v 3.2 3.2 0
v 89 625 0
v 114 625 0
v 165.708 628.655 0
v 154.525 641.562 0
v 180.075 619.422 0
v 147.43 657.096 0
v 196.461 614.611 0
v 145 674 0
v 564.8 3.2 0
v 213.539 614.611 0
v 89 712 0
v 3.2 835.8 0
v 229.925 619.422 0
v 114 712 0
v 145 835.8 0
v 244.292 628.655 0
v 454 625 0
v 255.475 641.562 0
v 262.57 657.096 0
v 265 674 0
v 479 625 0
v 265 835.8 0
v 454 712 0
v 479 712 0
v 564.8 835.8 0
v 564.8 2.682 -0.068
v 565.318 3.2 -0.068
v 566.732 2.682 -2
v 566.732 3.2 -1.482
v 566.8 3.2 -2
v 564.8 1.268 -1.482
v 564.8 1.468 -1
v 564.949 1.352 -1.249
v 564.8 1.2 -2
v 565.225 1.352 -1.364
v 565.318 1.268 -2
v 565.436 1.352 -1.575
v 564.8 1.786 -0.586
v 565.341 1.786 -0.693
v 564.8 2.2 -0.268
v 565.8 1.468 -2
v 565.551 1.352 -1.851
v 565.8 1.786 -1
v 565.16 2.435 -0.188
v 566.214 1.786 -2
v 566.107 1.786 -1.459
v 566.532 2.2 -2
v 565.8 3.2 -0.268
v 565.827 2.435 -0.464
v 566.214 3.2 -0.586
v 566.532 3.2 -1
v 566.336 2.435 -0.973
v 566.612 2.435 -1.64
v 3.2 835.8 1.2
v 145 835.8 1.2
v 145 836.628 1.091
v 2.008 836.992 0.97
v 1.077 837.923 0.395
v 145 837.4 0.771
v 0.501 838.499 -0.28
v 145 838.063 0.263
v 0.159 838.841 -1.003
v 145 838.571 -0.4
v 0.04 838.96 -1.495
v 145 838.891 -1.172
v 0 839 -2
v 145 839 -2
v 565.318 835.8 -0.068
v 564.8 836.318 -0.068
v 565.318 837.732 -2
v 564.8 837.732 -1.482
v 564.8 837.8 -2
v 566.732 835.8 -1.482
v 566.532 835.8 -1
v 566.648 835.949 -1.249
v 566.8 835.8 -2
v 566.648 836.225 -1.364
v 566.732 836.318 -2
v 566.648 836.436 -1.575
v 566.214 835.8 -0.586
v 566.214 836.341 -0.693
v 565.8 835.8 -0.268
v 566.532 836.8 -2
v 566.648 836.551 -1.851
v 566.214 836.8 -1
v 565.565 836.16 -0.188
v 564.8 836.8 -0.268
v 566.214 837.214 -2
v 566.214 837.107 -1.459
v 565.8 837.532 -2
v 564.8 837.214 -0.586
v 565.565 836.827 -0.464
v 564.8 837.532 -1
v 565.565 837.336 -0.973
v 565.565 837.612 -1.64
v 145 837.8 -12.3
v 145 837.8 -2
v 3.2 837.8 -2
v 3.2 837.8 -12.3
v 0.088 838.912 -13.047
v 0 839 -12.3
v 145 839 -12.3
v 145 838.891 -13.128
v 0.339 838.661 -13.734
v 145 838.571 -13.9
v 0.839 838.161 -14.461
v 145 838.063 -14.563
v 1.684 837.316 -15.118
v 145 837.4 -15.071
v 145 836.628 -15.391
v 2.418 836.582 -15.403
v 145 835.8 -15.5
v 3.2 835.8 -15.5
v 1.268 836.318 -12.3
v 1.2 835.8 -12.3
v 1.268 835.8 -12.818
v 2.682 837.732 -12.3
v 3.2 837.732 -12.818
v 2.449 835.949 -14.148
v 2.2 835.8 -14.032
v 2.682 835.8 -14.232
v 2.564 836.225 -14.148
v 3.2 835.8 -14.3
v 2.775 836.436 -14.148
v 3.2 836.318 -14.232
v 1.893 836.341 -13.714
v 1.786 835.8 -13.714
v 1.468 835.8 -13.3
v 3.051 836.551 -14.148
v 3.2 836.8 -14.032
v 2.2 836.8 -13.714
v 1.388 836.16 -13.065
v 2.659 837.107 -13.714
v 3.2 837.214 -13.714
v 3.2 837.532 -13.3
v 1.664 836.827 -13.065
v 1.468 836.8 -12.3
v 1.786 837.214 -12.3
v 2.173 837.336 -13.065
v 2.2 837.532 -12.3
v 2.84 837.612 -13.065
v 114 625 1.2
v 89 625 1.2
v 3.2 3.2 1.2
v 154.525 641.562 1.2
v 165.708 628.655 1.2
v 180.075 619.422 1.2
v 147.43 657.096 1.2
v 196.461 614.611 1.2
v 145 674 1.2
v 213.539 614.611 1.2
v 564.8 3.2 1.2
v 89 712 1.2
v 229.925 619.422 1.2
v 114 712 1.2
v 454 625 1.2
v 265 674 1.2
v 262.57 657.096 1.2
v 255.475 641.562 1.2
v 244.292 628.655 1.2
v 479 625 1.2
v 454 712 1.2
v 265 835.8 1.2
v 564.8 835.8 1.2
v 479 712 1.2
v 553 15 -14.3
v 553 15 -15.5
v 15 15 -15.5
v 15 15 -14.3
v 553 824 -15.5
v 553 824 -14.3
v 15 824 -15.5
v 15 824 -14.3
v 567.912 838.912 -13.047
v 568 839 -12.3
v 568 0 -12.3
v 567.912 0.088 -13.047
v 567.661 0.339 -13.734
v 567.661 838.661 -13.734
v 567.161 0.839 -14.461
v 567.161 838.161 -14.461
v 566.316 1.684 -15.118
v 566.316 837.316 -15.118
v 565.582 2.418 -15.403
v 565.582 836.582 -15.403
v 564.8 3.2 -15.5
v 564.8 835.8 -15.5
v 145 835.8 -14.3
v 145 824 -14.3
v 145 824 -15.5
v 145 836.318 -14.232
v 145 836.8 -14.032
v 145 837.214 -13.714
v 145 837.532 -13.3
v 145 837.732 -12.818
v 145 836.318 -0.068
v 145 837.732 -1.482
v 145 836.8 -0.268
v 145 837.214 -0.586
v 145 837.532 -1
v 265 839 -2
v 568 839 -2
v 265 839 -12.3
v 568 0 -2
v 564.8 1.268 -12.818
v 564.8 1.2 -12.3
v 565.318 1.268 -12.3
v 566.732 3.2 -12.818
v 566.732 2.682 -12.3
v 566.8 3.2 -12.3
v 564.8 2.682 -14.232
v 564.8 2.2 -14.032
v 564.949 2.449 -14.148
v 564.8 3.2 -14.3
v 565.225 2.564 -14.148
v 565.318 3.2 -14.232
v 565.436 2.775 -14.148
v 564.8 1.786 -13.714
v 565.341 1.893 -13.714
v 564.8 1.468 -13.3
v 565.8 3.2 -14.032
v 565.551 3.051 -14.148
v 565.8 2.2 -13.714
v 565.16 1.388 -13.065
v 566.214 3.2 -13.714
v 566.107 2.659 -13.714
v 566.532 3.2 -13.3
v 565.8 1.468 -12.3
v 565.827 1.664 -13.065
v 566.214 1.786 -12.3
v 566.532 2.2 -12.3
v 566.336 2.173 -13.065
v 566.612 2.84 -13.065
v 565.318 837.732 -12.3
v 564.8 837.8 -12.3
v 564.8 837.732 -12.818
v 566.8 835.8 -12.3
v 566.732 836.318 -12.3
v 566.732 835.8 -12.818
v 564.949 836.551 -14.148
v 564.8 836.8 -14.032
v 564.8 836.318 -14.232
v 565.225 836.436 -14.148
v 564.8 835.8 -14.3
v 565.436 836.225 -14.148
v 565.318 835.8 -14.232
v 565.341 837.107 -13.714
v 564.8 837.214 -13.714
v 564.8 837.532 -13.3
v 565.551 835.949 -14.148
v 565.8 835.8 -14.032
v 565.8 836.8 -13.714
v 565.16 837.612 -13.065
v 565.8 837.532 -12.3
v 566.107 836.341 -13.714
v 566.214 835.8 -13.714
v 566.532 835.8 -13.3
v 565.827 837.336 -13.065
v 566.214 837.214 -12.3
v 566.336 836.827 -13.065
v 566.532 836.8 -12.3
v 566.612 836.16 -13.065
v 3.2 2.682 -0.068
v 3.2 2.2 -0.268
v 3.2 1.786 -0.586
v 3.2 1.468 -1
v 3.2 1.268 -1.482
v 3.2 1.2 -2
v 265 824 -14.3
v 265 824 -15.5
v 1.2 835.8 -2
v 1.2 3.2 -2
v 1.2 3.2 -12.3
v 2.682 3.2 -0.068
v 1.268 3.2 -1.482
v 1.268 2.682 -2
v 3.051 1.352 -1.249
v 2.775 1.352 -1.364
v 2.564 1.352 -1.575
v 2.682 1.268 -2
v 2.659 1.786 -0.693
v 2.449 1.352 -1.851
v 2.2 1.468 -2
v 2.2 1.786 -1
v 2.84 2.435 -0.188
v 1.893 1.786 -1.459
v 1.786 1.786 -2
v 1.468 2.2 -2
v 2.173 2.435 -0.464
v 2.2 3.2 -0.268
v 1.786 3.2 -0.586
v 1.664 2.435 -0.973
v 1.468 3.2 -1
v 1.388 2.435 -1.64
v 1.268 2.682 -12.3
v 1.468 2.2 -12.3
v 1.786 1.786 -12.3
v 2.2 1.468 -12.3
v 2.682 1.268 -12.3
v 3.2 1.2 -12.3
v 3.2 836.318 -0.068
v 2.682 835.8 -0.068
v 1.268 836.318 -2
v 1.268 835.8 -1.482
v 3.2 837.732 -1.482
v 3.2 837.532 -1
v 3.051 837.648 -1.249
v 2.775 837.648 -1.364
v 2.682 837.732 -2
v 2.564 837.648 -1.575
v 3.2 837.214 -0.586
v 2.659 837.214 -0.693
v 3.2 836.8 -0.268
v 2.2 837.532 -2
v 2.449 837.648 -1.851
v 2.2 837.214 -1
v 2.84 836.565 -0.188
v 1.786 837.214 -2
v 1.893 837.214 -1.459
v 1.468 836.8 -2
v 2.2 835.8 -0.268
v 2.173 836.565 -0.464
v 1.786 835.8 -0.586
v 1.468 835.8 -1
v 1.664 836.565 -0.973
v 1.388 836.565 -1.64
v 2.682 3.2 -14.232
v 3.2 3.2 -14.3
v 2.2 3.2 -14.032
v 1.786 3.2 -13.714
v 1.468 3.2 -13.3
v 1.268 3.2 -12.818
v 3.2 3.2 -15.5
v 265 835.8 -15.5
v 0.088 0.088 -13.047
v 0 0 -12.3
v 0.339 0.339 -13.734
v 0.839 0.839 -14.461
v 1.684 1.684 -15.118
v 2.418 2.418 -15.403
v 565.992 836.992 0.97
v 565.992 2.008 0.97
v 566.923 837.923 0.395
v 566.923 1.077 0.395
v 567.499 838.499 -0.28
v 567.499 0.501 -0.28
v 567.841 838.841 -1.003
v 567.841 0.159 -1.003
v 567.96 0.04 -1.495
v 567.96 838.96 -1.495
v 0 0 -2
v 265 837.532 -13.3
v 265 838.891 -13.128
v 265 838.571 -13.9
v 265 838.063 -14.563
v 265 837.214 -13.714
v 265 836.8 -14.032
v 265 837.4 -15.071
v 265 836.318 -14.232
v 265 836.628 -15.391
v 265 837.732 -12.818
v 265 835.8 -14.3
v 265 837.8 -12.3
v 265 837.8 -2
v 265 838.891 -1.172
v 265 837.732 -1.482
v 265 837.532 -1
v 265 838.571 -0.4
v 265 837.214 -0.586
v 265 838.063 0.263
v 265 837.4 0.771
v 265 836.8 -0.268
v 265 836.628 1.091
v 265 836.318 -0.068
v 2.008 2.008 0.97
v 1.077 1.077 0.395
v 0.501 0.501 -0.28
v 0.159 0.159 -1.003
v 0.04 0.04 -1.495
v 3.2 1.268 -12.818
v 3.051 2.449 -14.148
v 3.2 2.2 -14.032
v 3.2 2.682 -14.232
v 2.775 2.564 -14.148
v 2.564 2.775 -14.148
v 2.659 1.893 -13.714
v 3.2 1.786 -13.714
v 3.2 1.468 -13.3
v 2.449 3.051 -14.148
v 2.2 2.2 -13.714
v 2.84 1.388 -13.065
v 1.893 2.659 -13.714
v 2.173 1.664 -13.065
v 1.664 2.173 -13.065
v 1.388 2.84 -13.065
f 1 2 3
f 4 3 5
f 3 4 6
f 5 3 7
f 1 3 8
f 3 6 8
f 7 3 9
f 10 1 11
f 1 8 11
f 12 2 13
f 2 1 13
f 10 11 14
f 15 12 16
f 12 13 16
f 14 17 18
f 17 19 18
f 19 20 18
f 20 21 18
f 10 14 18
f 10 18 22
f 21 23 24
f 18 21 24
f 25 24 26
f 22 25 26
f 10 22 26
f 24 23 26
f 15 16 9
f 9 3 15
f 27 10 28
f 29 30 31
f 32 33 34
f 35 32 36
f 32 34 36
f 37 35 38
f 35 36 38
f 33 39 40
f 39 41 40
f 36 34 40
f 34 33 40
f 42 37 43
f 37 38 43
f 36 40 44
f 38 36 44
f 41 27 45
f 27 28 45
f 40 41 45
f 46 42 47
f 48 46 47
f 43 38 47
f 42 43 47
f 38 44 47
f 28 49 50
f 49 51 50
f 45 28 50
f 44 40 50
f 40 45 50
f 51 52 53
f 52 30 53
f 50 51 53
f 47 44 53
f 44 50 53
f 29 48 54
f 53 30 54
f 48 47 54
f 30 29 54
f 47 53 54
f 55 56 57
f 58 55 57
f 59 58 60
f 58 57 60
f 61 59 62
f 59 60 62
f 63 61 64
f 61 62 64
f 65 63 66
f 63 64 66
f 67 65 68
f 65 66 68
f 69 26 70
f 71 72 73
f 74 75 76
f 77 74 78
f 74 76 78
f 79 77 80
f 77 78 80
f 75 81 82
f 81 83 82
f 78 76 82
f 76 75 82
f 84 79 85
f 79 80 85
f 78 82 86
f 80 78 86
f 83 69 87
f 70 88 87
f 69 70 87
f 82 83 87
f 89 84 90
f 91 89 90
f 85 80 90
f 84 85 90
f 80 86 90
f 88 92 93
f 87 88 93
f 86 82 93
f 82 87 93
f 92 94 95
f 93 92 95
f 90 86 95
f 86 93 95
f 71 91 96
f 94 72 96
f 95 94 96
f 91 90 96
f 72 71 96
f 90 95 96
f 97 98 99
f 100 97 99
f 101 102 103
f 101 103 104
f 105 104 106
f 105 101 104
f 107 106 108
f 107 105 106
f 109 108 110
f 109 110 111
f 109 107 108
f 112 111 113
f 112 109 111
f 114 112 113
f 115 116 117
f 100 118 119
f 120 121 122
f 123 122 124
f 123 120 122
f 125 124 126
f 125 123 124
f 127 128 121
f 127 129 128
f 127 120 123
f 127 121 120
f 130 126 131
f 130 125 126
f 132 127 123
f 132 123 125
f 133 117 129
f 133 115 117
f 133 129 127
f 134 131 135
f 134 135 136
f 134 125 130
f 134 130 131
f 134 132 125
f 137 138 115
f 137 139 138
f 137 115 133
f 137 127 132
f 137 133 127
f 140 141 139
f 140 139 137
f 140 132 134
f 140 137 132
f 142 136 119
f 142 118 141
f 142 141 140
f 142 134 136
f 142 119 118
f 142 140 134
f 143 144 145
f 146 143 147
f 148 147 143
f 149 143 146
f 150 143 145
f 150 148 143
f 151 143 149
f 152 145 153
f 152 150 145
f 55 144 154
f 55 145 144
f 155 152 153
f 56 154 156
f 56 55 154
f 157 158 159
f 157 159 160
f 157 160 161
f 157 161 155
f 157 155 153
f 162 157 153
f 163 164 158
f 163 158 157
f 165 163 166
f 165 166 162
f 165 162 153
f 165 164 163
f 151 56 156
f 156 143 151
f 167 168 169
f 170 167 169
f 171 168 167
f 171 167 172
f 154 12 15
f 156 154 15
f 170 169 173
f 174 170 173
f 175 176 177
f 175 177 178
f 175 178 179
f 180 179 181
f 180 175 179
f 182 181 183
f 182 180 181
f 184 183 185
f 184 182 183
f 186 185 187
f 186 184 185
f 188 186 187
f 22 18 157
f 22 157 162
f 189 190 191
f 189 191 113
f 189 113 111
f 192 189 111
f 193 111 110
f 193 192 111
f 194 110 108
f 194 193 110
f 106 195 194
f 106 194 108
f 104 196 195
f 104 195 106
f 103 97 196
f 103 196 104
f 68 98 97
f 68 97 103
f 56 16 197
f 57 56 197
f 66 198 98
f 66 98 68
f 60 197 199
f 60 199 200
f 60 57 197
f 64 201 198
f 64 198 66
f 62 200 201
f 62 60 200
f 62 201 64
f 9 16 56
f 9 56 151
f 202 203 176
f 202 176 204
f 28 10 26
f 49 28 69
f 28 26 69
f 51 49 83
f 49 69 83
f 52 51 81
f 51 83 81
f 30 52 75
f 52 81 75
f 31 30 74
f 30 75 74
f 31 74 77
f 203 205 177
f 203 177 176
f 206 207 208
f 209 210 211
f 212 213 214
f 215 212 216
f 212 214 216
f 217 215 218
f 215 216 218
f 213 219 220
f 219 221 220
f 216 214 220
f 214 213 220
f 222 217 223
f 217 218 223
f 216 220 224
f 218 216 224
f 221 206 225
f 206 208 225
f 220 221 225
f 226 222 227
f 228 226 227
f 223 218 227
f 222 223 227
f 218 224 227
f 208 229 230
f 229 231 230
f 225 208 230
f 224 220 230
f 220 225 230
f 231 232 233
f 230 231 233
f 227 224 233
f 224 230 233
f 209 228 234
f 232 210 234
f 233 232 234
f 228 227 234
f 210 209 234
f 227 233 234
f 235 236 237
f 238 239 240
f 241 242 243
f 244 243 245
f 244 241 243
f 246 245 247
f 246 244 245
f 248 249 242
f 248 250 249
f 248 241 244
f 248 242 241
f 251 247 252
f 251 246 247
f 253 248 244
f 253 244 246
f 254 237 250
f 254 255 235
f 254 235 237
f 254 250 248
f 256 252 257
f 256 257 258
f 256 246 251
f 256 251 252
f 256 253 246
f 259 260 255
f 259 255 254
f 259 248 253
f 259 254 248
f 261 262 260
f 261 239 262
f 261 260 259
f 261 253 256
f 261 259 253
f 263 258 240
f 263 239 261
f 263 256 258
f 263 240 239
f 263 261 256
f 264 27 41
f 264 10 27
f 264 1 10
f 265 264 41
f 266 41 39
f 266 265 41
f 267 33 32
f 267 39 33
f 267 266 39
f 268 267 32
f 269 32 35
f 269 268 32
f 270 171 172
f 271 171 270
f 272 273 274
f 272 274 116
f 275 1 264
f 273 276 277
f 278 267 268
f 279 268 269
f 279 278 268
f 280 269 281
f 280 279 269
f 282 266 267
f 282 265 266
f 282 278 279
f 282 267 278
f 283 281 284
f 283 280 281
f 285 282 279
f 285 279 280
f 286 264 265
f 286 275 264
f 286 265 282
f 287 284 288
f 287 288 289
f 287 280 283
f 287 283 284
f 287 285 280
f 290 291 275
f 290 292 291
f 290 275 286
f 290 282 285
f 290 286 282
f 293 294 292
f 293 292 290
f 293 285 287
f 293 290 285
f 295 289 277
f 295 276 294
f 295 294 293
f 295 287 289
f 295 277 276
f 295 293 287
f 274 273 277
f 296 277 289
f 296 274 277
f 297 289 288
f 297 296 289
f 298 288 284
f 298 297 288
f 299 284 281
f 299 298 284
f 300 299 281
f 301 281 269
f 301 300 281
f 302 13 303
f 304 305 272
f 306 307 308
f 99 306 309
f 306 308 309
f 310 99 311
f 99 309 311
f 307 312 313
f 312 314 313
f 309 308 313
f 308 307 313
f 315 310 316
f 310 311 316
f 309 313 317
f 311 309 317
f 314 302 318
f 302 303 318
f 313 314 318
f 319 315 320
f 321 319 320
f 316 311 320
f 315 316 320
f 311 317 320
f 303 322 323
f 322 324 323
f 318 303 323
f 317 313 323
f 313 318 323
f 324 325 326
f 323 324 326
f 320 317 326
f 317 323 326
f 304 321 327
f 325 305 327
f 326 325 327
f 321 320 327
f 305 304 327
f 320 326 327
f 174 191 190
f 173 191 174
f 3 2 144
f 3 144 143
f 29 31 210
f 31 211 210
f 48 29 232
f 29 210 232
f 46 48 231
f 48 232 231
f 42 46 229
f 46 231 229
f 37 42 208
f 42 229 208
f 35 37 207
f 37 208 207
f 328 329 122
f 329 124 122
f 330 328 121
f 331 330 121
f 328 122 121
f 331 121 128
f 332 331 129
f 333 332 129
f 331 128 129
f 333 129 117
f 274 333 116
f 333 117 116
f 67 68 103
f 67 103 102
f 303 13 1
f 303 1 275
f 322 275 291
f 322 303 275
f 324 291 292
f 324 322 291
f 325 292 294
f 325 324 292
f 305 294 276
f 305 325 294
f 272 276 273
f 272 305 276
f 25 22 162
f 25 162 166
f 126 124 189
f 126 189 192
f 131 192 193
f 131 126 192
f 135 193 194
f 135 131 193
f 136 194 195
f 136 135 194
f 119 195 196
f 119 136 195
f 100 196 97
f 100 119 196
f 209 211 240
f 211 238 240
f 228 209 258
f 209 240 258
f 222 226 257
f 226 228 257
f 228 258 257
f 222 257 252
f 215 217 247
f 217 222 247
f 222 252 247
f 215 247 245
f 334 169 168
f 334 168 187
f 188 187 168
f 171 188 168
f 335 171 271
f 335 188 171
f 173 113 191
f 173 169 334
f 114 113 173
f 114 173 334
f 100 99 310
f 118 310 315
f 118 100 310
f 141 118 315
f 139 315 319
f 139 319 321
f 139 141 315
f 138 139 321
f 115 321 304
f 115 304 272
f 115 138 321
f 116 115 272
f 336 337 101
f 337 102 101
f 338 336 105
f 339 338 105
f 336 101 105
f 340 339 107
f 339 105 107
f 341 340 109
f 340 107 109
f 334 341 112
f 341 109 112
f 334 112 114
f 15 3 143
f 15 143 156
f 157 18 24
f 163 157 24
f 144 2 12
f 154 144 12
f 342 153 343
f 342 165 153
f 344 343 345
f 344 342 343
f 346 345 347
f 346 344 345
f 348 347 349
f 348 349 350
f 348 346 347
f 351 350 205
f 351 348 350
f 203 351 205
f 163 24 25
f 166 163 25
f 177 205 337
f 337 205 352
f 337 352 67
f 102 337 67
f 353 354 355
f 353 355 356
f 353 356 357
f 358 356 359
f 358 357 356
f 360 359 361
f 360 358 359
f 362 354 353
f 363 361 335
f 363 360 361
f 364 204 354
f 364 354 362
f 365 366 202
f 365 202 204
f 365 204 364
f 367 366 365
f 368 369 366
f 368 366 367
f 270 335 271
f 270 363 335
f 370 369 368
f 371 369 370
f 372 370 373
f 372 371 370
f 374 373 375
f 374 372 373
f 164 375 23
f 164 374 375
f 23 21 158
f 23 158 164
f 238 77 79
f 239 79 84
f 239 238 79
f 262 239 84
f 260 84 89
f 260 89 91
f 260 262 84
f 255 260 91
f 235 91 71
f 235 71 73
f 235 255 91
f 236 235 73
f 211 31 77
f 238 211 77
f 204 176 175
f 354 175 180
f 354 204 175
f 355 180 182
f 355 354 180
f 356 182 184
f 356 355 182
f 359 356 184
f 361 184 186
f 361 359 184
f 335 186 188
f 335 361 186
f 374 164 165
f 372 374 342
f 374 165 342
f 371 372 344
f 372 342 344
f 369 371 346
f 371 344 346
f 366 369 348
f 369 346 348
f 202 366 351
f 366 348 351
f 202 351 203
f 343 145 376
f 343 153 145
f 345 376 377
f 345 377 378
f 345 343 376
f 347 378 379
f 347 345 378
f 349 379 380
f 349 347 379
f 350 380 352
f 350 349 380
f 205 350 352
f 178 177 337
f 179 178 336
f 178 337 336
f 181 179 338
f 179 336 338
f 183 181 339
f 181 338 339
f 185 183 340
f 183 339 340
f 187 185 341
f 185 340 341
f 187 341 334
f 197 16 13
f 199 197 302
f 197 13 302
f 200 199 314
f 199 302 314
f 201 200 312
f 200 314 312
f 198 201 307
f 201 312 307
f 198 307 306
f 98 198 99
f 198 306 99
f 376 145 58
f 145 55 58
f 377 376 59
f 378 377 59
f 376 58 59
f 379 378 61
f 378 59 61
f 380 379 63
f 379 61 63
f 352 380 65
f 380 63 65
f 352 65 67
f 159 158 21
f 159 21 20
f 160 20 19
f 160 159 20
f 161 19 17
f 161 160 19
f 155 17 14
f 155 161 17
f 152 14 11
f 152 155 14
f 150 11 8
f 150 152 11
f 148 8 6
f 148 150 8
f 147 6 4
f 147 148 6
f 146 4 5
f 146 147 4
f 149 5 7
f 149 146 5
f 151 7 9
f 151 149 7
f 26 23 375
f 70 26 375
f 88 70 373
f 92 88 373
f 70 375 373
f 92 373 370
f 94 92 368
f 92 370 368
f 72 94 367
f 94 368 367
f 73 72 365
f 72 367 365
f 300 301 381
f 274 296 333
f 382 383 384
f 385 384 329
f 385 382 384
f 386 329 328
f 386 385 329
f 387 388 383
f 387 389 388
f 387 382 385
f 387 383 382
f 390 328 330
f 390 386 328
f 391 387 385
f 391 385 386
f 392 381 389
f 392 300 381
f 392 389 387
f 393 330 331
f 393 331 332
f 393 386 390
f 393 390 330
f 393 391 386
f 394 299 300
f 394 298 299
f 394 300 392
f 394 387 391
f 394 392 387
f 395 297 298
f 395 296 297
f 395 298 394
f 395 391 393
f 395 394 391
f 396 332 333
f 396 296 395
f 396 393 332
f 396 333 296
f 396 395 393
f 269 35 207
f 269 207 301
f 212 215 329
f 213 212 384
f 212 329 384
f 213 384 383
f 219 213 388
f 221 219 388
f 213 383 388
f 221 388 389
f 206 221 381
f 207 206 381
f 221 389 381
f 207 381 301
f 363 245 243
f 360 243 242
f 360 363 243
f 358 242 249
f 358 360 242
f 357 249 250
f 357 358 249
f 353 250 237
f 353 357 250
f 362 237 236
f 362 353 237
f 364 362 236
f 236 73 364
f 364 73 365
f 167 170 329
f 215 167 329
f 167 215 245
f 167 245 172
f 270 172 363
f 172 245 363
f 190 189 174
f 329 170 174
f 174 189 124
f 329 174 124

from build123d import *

# Parameters (mm, degrees)
SKETCH_1_W          = 568
SKETCH_1_H          = 839
SKETCH_1_W_2        = 25
SKETCH_1_H_2        = 87
EXTRUDE_1_DEPTH     = 1.2
SKETCH_2_W          = 568
SKETCH_2_H          = 839
SKETCH_2_W_2        = 565.6
SKETCH_2_H_2        = 836.6
EXTRUDE_2_DEPTH     = 15.5
SKETCH_3_W          = 568
SKETCH_3_H          = 839
SKETCH_3_W_2        = 538
SKETCH_3_H_2        = 809
EXTRUDE_3_DEPTH     = 1.2
FILLET_1_R          = 2
FILLET_2_R          = 3.2
FILLET_3_R          = 3.2
CUT_EXTRUDE_1_DEPTH = 1014.323191287


with BuildPart() as part:
    # 스케치1 → 보스-돌출1 (new body)
    with BuildSketch(Plane.XY):
        with Locations((284, 419.5)):
            Rectangle(SKETCH_1_W, SKETCH_1_H)
        with Locations((101.5, 668.5)):
            Rectangle(SKETCH_1_W_2, SKETCH_1_H_2, mode=Mode.SUBTRACT)
        with Locations((466.5, 668.5)):
            Rectangle(SKETCH_1_W_2, SKETCH_1_H_2, mode=Mode.SUBTRACT)
    extrude(amount=EXTRUDE_1_DEPTH)

    # 스케치2 → 보스-돌출2 (add)
    with BuildSketch(Plane(origin=(0, 0, 0), x_dir=(-1, 0, 0), z_dir=(0, 0, -1))):
        with Locations((-284, 419.5)):
            Rectangle(SKETCH_2_W, SKETCH_2_H)
        with Locations((-284, 419.5)):
            Rectangle(SKETCH_2_W_2, SKETCH_2_H_2, mode=Mode.SUBTRACT)
    extrude(amount=EXTRUDE_2_DEPTH)

    # 스케치3 → 보스-돌출3 (add)
    with BuildSketch(Plane(origin=(0, 0, -15.5), x_dir=(-1, 0, 0), z_dir=(0, 0, -1))):
        with Locations((-284, 419.5)):
            Rectangle(SKETCH_3_W, SKETCH_3_H)
        with Locations((-284, 419.5)):
            Rectangle(SKETCH_3_W_2, SKETCH_3_H_2, mode=Mode.SUBTRACT)
    extrude(amount=-EXTRUDE_3_DEPTH)

    # 필렛1
    fillet_1_edges = [part.edges().sort_by_distance(p)[0] for p in [
        (1.2, 419.5, 0),
        (284, 837.8, 0),
        (566.8, 419.5, 0),
        (284, 1.2, 0),
        (566.8, 1.2, -7.15),
        (1.2, 1.2, -7.15),
        (284, 1.2, -14.3),
        (566.8, 837.8, -7.15),
        (1.2, 837.8, -7.15),
        (1.2, 419.5, -14.3),
        (284, 837.8, -14.3),
        (566.8, 419.5, -14.3),
    ]]
    fillet(fillet_1_edges, radius=FILLET_1_R)

    # 필렛2
    fillet_2_edges = [part.edges().sort_by_distance(p)[0] for p in [
        (568, 419.5, 1.2),
        (284, 839, 1.2),
        (0, 419.5, 1.2),
        (284, 0, 1.2),
    ]]
    fillet(fillet_2_edges, radius=FILLET_2_R)

    # 필렛3
    fillet_3_edges = [part.edges().sort_by_distance(p)[0] for p in [
        (284, 0, -15.5),
        (0, 419.5, -15.5),
        (284, 839, -15.5),
        (568, 419.5, -15.5),
    ]]
    fillet(fillet_3_edges, radius=FILLET_3_R)

    # 스케치4 → 컷-돌출1 (cut, through all)
    with BuildSketch(Plane.XY.offset(1.2)):
        with BuildLine():
            Line((265, 952.257222416), (265, 674))
            ThreePointArc((265, 674), (205, 614), (145, 674))
            Line((145, 674), (145, 952.257222416))
            ThreePointArc((145, 952.257222416), (205, 1012.257222416), (265, 952.257222416))
        make_face()
    extrude(amount=-CUT_EXTRUDE_1_DEPTH, mode=Mode.SUBTRACT)


solid = part.part
